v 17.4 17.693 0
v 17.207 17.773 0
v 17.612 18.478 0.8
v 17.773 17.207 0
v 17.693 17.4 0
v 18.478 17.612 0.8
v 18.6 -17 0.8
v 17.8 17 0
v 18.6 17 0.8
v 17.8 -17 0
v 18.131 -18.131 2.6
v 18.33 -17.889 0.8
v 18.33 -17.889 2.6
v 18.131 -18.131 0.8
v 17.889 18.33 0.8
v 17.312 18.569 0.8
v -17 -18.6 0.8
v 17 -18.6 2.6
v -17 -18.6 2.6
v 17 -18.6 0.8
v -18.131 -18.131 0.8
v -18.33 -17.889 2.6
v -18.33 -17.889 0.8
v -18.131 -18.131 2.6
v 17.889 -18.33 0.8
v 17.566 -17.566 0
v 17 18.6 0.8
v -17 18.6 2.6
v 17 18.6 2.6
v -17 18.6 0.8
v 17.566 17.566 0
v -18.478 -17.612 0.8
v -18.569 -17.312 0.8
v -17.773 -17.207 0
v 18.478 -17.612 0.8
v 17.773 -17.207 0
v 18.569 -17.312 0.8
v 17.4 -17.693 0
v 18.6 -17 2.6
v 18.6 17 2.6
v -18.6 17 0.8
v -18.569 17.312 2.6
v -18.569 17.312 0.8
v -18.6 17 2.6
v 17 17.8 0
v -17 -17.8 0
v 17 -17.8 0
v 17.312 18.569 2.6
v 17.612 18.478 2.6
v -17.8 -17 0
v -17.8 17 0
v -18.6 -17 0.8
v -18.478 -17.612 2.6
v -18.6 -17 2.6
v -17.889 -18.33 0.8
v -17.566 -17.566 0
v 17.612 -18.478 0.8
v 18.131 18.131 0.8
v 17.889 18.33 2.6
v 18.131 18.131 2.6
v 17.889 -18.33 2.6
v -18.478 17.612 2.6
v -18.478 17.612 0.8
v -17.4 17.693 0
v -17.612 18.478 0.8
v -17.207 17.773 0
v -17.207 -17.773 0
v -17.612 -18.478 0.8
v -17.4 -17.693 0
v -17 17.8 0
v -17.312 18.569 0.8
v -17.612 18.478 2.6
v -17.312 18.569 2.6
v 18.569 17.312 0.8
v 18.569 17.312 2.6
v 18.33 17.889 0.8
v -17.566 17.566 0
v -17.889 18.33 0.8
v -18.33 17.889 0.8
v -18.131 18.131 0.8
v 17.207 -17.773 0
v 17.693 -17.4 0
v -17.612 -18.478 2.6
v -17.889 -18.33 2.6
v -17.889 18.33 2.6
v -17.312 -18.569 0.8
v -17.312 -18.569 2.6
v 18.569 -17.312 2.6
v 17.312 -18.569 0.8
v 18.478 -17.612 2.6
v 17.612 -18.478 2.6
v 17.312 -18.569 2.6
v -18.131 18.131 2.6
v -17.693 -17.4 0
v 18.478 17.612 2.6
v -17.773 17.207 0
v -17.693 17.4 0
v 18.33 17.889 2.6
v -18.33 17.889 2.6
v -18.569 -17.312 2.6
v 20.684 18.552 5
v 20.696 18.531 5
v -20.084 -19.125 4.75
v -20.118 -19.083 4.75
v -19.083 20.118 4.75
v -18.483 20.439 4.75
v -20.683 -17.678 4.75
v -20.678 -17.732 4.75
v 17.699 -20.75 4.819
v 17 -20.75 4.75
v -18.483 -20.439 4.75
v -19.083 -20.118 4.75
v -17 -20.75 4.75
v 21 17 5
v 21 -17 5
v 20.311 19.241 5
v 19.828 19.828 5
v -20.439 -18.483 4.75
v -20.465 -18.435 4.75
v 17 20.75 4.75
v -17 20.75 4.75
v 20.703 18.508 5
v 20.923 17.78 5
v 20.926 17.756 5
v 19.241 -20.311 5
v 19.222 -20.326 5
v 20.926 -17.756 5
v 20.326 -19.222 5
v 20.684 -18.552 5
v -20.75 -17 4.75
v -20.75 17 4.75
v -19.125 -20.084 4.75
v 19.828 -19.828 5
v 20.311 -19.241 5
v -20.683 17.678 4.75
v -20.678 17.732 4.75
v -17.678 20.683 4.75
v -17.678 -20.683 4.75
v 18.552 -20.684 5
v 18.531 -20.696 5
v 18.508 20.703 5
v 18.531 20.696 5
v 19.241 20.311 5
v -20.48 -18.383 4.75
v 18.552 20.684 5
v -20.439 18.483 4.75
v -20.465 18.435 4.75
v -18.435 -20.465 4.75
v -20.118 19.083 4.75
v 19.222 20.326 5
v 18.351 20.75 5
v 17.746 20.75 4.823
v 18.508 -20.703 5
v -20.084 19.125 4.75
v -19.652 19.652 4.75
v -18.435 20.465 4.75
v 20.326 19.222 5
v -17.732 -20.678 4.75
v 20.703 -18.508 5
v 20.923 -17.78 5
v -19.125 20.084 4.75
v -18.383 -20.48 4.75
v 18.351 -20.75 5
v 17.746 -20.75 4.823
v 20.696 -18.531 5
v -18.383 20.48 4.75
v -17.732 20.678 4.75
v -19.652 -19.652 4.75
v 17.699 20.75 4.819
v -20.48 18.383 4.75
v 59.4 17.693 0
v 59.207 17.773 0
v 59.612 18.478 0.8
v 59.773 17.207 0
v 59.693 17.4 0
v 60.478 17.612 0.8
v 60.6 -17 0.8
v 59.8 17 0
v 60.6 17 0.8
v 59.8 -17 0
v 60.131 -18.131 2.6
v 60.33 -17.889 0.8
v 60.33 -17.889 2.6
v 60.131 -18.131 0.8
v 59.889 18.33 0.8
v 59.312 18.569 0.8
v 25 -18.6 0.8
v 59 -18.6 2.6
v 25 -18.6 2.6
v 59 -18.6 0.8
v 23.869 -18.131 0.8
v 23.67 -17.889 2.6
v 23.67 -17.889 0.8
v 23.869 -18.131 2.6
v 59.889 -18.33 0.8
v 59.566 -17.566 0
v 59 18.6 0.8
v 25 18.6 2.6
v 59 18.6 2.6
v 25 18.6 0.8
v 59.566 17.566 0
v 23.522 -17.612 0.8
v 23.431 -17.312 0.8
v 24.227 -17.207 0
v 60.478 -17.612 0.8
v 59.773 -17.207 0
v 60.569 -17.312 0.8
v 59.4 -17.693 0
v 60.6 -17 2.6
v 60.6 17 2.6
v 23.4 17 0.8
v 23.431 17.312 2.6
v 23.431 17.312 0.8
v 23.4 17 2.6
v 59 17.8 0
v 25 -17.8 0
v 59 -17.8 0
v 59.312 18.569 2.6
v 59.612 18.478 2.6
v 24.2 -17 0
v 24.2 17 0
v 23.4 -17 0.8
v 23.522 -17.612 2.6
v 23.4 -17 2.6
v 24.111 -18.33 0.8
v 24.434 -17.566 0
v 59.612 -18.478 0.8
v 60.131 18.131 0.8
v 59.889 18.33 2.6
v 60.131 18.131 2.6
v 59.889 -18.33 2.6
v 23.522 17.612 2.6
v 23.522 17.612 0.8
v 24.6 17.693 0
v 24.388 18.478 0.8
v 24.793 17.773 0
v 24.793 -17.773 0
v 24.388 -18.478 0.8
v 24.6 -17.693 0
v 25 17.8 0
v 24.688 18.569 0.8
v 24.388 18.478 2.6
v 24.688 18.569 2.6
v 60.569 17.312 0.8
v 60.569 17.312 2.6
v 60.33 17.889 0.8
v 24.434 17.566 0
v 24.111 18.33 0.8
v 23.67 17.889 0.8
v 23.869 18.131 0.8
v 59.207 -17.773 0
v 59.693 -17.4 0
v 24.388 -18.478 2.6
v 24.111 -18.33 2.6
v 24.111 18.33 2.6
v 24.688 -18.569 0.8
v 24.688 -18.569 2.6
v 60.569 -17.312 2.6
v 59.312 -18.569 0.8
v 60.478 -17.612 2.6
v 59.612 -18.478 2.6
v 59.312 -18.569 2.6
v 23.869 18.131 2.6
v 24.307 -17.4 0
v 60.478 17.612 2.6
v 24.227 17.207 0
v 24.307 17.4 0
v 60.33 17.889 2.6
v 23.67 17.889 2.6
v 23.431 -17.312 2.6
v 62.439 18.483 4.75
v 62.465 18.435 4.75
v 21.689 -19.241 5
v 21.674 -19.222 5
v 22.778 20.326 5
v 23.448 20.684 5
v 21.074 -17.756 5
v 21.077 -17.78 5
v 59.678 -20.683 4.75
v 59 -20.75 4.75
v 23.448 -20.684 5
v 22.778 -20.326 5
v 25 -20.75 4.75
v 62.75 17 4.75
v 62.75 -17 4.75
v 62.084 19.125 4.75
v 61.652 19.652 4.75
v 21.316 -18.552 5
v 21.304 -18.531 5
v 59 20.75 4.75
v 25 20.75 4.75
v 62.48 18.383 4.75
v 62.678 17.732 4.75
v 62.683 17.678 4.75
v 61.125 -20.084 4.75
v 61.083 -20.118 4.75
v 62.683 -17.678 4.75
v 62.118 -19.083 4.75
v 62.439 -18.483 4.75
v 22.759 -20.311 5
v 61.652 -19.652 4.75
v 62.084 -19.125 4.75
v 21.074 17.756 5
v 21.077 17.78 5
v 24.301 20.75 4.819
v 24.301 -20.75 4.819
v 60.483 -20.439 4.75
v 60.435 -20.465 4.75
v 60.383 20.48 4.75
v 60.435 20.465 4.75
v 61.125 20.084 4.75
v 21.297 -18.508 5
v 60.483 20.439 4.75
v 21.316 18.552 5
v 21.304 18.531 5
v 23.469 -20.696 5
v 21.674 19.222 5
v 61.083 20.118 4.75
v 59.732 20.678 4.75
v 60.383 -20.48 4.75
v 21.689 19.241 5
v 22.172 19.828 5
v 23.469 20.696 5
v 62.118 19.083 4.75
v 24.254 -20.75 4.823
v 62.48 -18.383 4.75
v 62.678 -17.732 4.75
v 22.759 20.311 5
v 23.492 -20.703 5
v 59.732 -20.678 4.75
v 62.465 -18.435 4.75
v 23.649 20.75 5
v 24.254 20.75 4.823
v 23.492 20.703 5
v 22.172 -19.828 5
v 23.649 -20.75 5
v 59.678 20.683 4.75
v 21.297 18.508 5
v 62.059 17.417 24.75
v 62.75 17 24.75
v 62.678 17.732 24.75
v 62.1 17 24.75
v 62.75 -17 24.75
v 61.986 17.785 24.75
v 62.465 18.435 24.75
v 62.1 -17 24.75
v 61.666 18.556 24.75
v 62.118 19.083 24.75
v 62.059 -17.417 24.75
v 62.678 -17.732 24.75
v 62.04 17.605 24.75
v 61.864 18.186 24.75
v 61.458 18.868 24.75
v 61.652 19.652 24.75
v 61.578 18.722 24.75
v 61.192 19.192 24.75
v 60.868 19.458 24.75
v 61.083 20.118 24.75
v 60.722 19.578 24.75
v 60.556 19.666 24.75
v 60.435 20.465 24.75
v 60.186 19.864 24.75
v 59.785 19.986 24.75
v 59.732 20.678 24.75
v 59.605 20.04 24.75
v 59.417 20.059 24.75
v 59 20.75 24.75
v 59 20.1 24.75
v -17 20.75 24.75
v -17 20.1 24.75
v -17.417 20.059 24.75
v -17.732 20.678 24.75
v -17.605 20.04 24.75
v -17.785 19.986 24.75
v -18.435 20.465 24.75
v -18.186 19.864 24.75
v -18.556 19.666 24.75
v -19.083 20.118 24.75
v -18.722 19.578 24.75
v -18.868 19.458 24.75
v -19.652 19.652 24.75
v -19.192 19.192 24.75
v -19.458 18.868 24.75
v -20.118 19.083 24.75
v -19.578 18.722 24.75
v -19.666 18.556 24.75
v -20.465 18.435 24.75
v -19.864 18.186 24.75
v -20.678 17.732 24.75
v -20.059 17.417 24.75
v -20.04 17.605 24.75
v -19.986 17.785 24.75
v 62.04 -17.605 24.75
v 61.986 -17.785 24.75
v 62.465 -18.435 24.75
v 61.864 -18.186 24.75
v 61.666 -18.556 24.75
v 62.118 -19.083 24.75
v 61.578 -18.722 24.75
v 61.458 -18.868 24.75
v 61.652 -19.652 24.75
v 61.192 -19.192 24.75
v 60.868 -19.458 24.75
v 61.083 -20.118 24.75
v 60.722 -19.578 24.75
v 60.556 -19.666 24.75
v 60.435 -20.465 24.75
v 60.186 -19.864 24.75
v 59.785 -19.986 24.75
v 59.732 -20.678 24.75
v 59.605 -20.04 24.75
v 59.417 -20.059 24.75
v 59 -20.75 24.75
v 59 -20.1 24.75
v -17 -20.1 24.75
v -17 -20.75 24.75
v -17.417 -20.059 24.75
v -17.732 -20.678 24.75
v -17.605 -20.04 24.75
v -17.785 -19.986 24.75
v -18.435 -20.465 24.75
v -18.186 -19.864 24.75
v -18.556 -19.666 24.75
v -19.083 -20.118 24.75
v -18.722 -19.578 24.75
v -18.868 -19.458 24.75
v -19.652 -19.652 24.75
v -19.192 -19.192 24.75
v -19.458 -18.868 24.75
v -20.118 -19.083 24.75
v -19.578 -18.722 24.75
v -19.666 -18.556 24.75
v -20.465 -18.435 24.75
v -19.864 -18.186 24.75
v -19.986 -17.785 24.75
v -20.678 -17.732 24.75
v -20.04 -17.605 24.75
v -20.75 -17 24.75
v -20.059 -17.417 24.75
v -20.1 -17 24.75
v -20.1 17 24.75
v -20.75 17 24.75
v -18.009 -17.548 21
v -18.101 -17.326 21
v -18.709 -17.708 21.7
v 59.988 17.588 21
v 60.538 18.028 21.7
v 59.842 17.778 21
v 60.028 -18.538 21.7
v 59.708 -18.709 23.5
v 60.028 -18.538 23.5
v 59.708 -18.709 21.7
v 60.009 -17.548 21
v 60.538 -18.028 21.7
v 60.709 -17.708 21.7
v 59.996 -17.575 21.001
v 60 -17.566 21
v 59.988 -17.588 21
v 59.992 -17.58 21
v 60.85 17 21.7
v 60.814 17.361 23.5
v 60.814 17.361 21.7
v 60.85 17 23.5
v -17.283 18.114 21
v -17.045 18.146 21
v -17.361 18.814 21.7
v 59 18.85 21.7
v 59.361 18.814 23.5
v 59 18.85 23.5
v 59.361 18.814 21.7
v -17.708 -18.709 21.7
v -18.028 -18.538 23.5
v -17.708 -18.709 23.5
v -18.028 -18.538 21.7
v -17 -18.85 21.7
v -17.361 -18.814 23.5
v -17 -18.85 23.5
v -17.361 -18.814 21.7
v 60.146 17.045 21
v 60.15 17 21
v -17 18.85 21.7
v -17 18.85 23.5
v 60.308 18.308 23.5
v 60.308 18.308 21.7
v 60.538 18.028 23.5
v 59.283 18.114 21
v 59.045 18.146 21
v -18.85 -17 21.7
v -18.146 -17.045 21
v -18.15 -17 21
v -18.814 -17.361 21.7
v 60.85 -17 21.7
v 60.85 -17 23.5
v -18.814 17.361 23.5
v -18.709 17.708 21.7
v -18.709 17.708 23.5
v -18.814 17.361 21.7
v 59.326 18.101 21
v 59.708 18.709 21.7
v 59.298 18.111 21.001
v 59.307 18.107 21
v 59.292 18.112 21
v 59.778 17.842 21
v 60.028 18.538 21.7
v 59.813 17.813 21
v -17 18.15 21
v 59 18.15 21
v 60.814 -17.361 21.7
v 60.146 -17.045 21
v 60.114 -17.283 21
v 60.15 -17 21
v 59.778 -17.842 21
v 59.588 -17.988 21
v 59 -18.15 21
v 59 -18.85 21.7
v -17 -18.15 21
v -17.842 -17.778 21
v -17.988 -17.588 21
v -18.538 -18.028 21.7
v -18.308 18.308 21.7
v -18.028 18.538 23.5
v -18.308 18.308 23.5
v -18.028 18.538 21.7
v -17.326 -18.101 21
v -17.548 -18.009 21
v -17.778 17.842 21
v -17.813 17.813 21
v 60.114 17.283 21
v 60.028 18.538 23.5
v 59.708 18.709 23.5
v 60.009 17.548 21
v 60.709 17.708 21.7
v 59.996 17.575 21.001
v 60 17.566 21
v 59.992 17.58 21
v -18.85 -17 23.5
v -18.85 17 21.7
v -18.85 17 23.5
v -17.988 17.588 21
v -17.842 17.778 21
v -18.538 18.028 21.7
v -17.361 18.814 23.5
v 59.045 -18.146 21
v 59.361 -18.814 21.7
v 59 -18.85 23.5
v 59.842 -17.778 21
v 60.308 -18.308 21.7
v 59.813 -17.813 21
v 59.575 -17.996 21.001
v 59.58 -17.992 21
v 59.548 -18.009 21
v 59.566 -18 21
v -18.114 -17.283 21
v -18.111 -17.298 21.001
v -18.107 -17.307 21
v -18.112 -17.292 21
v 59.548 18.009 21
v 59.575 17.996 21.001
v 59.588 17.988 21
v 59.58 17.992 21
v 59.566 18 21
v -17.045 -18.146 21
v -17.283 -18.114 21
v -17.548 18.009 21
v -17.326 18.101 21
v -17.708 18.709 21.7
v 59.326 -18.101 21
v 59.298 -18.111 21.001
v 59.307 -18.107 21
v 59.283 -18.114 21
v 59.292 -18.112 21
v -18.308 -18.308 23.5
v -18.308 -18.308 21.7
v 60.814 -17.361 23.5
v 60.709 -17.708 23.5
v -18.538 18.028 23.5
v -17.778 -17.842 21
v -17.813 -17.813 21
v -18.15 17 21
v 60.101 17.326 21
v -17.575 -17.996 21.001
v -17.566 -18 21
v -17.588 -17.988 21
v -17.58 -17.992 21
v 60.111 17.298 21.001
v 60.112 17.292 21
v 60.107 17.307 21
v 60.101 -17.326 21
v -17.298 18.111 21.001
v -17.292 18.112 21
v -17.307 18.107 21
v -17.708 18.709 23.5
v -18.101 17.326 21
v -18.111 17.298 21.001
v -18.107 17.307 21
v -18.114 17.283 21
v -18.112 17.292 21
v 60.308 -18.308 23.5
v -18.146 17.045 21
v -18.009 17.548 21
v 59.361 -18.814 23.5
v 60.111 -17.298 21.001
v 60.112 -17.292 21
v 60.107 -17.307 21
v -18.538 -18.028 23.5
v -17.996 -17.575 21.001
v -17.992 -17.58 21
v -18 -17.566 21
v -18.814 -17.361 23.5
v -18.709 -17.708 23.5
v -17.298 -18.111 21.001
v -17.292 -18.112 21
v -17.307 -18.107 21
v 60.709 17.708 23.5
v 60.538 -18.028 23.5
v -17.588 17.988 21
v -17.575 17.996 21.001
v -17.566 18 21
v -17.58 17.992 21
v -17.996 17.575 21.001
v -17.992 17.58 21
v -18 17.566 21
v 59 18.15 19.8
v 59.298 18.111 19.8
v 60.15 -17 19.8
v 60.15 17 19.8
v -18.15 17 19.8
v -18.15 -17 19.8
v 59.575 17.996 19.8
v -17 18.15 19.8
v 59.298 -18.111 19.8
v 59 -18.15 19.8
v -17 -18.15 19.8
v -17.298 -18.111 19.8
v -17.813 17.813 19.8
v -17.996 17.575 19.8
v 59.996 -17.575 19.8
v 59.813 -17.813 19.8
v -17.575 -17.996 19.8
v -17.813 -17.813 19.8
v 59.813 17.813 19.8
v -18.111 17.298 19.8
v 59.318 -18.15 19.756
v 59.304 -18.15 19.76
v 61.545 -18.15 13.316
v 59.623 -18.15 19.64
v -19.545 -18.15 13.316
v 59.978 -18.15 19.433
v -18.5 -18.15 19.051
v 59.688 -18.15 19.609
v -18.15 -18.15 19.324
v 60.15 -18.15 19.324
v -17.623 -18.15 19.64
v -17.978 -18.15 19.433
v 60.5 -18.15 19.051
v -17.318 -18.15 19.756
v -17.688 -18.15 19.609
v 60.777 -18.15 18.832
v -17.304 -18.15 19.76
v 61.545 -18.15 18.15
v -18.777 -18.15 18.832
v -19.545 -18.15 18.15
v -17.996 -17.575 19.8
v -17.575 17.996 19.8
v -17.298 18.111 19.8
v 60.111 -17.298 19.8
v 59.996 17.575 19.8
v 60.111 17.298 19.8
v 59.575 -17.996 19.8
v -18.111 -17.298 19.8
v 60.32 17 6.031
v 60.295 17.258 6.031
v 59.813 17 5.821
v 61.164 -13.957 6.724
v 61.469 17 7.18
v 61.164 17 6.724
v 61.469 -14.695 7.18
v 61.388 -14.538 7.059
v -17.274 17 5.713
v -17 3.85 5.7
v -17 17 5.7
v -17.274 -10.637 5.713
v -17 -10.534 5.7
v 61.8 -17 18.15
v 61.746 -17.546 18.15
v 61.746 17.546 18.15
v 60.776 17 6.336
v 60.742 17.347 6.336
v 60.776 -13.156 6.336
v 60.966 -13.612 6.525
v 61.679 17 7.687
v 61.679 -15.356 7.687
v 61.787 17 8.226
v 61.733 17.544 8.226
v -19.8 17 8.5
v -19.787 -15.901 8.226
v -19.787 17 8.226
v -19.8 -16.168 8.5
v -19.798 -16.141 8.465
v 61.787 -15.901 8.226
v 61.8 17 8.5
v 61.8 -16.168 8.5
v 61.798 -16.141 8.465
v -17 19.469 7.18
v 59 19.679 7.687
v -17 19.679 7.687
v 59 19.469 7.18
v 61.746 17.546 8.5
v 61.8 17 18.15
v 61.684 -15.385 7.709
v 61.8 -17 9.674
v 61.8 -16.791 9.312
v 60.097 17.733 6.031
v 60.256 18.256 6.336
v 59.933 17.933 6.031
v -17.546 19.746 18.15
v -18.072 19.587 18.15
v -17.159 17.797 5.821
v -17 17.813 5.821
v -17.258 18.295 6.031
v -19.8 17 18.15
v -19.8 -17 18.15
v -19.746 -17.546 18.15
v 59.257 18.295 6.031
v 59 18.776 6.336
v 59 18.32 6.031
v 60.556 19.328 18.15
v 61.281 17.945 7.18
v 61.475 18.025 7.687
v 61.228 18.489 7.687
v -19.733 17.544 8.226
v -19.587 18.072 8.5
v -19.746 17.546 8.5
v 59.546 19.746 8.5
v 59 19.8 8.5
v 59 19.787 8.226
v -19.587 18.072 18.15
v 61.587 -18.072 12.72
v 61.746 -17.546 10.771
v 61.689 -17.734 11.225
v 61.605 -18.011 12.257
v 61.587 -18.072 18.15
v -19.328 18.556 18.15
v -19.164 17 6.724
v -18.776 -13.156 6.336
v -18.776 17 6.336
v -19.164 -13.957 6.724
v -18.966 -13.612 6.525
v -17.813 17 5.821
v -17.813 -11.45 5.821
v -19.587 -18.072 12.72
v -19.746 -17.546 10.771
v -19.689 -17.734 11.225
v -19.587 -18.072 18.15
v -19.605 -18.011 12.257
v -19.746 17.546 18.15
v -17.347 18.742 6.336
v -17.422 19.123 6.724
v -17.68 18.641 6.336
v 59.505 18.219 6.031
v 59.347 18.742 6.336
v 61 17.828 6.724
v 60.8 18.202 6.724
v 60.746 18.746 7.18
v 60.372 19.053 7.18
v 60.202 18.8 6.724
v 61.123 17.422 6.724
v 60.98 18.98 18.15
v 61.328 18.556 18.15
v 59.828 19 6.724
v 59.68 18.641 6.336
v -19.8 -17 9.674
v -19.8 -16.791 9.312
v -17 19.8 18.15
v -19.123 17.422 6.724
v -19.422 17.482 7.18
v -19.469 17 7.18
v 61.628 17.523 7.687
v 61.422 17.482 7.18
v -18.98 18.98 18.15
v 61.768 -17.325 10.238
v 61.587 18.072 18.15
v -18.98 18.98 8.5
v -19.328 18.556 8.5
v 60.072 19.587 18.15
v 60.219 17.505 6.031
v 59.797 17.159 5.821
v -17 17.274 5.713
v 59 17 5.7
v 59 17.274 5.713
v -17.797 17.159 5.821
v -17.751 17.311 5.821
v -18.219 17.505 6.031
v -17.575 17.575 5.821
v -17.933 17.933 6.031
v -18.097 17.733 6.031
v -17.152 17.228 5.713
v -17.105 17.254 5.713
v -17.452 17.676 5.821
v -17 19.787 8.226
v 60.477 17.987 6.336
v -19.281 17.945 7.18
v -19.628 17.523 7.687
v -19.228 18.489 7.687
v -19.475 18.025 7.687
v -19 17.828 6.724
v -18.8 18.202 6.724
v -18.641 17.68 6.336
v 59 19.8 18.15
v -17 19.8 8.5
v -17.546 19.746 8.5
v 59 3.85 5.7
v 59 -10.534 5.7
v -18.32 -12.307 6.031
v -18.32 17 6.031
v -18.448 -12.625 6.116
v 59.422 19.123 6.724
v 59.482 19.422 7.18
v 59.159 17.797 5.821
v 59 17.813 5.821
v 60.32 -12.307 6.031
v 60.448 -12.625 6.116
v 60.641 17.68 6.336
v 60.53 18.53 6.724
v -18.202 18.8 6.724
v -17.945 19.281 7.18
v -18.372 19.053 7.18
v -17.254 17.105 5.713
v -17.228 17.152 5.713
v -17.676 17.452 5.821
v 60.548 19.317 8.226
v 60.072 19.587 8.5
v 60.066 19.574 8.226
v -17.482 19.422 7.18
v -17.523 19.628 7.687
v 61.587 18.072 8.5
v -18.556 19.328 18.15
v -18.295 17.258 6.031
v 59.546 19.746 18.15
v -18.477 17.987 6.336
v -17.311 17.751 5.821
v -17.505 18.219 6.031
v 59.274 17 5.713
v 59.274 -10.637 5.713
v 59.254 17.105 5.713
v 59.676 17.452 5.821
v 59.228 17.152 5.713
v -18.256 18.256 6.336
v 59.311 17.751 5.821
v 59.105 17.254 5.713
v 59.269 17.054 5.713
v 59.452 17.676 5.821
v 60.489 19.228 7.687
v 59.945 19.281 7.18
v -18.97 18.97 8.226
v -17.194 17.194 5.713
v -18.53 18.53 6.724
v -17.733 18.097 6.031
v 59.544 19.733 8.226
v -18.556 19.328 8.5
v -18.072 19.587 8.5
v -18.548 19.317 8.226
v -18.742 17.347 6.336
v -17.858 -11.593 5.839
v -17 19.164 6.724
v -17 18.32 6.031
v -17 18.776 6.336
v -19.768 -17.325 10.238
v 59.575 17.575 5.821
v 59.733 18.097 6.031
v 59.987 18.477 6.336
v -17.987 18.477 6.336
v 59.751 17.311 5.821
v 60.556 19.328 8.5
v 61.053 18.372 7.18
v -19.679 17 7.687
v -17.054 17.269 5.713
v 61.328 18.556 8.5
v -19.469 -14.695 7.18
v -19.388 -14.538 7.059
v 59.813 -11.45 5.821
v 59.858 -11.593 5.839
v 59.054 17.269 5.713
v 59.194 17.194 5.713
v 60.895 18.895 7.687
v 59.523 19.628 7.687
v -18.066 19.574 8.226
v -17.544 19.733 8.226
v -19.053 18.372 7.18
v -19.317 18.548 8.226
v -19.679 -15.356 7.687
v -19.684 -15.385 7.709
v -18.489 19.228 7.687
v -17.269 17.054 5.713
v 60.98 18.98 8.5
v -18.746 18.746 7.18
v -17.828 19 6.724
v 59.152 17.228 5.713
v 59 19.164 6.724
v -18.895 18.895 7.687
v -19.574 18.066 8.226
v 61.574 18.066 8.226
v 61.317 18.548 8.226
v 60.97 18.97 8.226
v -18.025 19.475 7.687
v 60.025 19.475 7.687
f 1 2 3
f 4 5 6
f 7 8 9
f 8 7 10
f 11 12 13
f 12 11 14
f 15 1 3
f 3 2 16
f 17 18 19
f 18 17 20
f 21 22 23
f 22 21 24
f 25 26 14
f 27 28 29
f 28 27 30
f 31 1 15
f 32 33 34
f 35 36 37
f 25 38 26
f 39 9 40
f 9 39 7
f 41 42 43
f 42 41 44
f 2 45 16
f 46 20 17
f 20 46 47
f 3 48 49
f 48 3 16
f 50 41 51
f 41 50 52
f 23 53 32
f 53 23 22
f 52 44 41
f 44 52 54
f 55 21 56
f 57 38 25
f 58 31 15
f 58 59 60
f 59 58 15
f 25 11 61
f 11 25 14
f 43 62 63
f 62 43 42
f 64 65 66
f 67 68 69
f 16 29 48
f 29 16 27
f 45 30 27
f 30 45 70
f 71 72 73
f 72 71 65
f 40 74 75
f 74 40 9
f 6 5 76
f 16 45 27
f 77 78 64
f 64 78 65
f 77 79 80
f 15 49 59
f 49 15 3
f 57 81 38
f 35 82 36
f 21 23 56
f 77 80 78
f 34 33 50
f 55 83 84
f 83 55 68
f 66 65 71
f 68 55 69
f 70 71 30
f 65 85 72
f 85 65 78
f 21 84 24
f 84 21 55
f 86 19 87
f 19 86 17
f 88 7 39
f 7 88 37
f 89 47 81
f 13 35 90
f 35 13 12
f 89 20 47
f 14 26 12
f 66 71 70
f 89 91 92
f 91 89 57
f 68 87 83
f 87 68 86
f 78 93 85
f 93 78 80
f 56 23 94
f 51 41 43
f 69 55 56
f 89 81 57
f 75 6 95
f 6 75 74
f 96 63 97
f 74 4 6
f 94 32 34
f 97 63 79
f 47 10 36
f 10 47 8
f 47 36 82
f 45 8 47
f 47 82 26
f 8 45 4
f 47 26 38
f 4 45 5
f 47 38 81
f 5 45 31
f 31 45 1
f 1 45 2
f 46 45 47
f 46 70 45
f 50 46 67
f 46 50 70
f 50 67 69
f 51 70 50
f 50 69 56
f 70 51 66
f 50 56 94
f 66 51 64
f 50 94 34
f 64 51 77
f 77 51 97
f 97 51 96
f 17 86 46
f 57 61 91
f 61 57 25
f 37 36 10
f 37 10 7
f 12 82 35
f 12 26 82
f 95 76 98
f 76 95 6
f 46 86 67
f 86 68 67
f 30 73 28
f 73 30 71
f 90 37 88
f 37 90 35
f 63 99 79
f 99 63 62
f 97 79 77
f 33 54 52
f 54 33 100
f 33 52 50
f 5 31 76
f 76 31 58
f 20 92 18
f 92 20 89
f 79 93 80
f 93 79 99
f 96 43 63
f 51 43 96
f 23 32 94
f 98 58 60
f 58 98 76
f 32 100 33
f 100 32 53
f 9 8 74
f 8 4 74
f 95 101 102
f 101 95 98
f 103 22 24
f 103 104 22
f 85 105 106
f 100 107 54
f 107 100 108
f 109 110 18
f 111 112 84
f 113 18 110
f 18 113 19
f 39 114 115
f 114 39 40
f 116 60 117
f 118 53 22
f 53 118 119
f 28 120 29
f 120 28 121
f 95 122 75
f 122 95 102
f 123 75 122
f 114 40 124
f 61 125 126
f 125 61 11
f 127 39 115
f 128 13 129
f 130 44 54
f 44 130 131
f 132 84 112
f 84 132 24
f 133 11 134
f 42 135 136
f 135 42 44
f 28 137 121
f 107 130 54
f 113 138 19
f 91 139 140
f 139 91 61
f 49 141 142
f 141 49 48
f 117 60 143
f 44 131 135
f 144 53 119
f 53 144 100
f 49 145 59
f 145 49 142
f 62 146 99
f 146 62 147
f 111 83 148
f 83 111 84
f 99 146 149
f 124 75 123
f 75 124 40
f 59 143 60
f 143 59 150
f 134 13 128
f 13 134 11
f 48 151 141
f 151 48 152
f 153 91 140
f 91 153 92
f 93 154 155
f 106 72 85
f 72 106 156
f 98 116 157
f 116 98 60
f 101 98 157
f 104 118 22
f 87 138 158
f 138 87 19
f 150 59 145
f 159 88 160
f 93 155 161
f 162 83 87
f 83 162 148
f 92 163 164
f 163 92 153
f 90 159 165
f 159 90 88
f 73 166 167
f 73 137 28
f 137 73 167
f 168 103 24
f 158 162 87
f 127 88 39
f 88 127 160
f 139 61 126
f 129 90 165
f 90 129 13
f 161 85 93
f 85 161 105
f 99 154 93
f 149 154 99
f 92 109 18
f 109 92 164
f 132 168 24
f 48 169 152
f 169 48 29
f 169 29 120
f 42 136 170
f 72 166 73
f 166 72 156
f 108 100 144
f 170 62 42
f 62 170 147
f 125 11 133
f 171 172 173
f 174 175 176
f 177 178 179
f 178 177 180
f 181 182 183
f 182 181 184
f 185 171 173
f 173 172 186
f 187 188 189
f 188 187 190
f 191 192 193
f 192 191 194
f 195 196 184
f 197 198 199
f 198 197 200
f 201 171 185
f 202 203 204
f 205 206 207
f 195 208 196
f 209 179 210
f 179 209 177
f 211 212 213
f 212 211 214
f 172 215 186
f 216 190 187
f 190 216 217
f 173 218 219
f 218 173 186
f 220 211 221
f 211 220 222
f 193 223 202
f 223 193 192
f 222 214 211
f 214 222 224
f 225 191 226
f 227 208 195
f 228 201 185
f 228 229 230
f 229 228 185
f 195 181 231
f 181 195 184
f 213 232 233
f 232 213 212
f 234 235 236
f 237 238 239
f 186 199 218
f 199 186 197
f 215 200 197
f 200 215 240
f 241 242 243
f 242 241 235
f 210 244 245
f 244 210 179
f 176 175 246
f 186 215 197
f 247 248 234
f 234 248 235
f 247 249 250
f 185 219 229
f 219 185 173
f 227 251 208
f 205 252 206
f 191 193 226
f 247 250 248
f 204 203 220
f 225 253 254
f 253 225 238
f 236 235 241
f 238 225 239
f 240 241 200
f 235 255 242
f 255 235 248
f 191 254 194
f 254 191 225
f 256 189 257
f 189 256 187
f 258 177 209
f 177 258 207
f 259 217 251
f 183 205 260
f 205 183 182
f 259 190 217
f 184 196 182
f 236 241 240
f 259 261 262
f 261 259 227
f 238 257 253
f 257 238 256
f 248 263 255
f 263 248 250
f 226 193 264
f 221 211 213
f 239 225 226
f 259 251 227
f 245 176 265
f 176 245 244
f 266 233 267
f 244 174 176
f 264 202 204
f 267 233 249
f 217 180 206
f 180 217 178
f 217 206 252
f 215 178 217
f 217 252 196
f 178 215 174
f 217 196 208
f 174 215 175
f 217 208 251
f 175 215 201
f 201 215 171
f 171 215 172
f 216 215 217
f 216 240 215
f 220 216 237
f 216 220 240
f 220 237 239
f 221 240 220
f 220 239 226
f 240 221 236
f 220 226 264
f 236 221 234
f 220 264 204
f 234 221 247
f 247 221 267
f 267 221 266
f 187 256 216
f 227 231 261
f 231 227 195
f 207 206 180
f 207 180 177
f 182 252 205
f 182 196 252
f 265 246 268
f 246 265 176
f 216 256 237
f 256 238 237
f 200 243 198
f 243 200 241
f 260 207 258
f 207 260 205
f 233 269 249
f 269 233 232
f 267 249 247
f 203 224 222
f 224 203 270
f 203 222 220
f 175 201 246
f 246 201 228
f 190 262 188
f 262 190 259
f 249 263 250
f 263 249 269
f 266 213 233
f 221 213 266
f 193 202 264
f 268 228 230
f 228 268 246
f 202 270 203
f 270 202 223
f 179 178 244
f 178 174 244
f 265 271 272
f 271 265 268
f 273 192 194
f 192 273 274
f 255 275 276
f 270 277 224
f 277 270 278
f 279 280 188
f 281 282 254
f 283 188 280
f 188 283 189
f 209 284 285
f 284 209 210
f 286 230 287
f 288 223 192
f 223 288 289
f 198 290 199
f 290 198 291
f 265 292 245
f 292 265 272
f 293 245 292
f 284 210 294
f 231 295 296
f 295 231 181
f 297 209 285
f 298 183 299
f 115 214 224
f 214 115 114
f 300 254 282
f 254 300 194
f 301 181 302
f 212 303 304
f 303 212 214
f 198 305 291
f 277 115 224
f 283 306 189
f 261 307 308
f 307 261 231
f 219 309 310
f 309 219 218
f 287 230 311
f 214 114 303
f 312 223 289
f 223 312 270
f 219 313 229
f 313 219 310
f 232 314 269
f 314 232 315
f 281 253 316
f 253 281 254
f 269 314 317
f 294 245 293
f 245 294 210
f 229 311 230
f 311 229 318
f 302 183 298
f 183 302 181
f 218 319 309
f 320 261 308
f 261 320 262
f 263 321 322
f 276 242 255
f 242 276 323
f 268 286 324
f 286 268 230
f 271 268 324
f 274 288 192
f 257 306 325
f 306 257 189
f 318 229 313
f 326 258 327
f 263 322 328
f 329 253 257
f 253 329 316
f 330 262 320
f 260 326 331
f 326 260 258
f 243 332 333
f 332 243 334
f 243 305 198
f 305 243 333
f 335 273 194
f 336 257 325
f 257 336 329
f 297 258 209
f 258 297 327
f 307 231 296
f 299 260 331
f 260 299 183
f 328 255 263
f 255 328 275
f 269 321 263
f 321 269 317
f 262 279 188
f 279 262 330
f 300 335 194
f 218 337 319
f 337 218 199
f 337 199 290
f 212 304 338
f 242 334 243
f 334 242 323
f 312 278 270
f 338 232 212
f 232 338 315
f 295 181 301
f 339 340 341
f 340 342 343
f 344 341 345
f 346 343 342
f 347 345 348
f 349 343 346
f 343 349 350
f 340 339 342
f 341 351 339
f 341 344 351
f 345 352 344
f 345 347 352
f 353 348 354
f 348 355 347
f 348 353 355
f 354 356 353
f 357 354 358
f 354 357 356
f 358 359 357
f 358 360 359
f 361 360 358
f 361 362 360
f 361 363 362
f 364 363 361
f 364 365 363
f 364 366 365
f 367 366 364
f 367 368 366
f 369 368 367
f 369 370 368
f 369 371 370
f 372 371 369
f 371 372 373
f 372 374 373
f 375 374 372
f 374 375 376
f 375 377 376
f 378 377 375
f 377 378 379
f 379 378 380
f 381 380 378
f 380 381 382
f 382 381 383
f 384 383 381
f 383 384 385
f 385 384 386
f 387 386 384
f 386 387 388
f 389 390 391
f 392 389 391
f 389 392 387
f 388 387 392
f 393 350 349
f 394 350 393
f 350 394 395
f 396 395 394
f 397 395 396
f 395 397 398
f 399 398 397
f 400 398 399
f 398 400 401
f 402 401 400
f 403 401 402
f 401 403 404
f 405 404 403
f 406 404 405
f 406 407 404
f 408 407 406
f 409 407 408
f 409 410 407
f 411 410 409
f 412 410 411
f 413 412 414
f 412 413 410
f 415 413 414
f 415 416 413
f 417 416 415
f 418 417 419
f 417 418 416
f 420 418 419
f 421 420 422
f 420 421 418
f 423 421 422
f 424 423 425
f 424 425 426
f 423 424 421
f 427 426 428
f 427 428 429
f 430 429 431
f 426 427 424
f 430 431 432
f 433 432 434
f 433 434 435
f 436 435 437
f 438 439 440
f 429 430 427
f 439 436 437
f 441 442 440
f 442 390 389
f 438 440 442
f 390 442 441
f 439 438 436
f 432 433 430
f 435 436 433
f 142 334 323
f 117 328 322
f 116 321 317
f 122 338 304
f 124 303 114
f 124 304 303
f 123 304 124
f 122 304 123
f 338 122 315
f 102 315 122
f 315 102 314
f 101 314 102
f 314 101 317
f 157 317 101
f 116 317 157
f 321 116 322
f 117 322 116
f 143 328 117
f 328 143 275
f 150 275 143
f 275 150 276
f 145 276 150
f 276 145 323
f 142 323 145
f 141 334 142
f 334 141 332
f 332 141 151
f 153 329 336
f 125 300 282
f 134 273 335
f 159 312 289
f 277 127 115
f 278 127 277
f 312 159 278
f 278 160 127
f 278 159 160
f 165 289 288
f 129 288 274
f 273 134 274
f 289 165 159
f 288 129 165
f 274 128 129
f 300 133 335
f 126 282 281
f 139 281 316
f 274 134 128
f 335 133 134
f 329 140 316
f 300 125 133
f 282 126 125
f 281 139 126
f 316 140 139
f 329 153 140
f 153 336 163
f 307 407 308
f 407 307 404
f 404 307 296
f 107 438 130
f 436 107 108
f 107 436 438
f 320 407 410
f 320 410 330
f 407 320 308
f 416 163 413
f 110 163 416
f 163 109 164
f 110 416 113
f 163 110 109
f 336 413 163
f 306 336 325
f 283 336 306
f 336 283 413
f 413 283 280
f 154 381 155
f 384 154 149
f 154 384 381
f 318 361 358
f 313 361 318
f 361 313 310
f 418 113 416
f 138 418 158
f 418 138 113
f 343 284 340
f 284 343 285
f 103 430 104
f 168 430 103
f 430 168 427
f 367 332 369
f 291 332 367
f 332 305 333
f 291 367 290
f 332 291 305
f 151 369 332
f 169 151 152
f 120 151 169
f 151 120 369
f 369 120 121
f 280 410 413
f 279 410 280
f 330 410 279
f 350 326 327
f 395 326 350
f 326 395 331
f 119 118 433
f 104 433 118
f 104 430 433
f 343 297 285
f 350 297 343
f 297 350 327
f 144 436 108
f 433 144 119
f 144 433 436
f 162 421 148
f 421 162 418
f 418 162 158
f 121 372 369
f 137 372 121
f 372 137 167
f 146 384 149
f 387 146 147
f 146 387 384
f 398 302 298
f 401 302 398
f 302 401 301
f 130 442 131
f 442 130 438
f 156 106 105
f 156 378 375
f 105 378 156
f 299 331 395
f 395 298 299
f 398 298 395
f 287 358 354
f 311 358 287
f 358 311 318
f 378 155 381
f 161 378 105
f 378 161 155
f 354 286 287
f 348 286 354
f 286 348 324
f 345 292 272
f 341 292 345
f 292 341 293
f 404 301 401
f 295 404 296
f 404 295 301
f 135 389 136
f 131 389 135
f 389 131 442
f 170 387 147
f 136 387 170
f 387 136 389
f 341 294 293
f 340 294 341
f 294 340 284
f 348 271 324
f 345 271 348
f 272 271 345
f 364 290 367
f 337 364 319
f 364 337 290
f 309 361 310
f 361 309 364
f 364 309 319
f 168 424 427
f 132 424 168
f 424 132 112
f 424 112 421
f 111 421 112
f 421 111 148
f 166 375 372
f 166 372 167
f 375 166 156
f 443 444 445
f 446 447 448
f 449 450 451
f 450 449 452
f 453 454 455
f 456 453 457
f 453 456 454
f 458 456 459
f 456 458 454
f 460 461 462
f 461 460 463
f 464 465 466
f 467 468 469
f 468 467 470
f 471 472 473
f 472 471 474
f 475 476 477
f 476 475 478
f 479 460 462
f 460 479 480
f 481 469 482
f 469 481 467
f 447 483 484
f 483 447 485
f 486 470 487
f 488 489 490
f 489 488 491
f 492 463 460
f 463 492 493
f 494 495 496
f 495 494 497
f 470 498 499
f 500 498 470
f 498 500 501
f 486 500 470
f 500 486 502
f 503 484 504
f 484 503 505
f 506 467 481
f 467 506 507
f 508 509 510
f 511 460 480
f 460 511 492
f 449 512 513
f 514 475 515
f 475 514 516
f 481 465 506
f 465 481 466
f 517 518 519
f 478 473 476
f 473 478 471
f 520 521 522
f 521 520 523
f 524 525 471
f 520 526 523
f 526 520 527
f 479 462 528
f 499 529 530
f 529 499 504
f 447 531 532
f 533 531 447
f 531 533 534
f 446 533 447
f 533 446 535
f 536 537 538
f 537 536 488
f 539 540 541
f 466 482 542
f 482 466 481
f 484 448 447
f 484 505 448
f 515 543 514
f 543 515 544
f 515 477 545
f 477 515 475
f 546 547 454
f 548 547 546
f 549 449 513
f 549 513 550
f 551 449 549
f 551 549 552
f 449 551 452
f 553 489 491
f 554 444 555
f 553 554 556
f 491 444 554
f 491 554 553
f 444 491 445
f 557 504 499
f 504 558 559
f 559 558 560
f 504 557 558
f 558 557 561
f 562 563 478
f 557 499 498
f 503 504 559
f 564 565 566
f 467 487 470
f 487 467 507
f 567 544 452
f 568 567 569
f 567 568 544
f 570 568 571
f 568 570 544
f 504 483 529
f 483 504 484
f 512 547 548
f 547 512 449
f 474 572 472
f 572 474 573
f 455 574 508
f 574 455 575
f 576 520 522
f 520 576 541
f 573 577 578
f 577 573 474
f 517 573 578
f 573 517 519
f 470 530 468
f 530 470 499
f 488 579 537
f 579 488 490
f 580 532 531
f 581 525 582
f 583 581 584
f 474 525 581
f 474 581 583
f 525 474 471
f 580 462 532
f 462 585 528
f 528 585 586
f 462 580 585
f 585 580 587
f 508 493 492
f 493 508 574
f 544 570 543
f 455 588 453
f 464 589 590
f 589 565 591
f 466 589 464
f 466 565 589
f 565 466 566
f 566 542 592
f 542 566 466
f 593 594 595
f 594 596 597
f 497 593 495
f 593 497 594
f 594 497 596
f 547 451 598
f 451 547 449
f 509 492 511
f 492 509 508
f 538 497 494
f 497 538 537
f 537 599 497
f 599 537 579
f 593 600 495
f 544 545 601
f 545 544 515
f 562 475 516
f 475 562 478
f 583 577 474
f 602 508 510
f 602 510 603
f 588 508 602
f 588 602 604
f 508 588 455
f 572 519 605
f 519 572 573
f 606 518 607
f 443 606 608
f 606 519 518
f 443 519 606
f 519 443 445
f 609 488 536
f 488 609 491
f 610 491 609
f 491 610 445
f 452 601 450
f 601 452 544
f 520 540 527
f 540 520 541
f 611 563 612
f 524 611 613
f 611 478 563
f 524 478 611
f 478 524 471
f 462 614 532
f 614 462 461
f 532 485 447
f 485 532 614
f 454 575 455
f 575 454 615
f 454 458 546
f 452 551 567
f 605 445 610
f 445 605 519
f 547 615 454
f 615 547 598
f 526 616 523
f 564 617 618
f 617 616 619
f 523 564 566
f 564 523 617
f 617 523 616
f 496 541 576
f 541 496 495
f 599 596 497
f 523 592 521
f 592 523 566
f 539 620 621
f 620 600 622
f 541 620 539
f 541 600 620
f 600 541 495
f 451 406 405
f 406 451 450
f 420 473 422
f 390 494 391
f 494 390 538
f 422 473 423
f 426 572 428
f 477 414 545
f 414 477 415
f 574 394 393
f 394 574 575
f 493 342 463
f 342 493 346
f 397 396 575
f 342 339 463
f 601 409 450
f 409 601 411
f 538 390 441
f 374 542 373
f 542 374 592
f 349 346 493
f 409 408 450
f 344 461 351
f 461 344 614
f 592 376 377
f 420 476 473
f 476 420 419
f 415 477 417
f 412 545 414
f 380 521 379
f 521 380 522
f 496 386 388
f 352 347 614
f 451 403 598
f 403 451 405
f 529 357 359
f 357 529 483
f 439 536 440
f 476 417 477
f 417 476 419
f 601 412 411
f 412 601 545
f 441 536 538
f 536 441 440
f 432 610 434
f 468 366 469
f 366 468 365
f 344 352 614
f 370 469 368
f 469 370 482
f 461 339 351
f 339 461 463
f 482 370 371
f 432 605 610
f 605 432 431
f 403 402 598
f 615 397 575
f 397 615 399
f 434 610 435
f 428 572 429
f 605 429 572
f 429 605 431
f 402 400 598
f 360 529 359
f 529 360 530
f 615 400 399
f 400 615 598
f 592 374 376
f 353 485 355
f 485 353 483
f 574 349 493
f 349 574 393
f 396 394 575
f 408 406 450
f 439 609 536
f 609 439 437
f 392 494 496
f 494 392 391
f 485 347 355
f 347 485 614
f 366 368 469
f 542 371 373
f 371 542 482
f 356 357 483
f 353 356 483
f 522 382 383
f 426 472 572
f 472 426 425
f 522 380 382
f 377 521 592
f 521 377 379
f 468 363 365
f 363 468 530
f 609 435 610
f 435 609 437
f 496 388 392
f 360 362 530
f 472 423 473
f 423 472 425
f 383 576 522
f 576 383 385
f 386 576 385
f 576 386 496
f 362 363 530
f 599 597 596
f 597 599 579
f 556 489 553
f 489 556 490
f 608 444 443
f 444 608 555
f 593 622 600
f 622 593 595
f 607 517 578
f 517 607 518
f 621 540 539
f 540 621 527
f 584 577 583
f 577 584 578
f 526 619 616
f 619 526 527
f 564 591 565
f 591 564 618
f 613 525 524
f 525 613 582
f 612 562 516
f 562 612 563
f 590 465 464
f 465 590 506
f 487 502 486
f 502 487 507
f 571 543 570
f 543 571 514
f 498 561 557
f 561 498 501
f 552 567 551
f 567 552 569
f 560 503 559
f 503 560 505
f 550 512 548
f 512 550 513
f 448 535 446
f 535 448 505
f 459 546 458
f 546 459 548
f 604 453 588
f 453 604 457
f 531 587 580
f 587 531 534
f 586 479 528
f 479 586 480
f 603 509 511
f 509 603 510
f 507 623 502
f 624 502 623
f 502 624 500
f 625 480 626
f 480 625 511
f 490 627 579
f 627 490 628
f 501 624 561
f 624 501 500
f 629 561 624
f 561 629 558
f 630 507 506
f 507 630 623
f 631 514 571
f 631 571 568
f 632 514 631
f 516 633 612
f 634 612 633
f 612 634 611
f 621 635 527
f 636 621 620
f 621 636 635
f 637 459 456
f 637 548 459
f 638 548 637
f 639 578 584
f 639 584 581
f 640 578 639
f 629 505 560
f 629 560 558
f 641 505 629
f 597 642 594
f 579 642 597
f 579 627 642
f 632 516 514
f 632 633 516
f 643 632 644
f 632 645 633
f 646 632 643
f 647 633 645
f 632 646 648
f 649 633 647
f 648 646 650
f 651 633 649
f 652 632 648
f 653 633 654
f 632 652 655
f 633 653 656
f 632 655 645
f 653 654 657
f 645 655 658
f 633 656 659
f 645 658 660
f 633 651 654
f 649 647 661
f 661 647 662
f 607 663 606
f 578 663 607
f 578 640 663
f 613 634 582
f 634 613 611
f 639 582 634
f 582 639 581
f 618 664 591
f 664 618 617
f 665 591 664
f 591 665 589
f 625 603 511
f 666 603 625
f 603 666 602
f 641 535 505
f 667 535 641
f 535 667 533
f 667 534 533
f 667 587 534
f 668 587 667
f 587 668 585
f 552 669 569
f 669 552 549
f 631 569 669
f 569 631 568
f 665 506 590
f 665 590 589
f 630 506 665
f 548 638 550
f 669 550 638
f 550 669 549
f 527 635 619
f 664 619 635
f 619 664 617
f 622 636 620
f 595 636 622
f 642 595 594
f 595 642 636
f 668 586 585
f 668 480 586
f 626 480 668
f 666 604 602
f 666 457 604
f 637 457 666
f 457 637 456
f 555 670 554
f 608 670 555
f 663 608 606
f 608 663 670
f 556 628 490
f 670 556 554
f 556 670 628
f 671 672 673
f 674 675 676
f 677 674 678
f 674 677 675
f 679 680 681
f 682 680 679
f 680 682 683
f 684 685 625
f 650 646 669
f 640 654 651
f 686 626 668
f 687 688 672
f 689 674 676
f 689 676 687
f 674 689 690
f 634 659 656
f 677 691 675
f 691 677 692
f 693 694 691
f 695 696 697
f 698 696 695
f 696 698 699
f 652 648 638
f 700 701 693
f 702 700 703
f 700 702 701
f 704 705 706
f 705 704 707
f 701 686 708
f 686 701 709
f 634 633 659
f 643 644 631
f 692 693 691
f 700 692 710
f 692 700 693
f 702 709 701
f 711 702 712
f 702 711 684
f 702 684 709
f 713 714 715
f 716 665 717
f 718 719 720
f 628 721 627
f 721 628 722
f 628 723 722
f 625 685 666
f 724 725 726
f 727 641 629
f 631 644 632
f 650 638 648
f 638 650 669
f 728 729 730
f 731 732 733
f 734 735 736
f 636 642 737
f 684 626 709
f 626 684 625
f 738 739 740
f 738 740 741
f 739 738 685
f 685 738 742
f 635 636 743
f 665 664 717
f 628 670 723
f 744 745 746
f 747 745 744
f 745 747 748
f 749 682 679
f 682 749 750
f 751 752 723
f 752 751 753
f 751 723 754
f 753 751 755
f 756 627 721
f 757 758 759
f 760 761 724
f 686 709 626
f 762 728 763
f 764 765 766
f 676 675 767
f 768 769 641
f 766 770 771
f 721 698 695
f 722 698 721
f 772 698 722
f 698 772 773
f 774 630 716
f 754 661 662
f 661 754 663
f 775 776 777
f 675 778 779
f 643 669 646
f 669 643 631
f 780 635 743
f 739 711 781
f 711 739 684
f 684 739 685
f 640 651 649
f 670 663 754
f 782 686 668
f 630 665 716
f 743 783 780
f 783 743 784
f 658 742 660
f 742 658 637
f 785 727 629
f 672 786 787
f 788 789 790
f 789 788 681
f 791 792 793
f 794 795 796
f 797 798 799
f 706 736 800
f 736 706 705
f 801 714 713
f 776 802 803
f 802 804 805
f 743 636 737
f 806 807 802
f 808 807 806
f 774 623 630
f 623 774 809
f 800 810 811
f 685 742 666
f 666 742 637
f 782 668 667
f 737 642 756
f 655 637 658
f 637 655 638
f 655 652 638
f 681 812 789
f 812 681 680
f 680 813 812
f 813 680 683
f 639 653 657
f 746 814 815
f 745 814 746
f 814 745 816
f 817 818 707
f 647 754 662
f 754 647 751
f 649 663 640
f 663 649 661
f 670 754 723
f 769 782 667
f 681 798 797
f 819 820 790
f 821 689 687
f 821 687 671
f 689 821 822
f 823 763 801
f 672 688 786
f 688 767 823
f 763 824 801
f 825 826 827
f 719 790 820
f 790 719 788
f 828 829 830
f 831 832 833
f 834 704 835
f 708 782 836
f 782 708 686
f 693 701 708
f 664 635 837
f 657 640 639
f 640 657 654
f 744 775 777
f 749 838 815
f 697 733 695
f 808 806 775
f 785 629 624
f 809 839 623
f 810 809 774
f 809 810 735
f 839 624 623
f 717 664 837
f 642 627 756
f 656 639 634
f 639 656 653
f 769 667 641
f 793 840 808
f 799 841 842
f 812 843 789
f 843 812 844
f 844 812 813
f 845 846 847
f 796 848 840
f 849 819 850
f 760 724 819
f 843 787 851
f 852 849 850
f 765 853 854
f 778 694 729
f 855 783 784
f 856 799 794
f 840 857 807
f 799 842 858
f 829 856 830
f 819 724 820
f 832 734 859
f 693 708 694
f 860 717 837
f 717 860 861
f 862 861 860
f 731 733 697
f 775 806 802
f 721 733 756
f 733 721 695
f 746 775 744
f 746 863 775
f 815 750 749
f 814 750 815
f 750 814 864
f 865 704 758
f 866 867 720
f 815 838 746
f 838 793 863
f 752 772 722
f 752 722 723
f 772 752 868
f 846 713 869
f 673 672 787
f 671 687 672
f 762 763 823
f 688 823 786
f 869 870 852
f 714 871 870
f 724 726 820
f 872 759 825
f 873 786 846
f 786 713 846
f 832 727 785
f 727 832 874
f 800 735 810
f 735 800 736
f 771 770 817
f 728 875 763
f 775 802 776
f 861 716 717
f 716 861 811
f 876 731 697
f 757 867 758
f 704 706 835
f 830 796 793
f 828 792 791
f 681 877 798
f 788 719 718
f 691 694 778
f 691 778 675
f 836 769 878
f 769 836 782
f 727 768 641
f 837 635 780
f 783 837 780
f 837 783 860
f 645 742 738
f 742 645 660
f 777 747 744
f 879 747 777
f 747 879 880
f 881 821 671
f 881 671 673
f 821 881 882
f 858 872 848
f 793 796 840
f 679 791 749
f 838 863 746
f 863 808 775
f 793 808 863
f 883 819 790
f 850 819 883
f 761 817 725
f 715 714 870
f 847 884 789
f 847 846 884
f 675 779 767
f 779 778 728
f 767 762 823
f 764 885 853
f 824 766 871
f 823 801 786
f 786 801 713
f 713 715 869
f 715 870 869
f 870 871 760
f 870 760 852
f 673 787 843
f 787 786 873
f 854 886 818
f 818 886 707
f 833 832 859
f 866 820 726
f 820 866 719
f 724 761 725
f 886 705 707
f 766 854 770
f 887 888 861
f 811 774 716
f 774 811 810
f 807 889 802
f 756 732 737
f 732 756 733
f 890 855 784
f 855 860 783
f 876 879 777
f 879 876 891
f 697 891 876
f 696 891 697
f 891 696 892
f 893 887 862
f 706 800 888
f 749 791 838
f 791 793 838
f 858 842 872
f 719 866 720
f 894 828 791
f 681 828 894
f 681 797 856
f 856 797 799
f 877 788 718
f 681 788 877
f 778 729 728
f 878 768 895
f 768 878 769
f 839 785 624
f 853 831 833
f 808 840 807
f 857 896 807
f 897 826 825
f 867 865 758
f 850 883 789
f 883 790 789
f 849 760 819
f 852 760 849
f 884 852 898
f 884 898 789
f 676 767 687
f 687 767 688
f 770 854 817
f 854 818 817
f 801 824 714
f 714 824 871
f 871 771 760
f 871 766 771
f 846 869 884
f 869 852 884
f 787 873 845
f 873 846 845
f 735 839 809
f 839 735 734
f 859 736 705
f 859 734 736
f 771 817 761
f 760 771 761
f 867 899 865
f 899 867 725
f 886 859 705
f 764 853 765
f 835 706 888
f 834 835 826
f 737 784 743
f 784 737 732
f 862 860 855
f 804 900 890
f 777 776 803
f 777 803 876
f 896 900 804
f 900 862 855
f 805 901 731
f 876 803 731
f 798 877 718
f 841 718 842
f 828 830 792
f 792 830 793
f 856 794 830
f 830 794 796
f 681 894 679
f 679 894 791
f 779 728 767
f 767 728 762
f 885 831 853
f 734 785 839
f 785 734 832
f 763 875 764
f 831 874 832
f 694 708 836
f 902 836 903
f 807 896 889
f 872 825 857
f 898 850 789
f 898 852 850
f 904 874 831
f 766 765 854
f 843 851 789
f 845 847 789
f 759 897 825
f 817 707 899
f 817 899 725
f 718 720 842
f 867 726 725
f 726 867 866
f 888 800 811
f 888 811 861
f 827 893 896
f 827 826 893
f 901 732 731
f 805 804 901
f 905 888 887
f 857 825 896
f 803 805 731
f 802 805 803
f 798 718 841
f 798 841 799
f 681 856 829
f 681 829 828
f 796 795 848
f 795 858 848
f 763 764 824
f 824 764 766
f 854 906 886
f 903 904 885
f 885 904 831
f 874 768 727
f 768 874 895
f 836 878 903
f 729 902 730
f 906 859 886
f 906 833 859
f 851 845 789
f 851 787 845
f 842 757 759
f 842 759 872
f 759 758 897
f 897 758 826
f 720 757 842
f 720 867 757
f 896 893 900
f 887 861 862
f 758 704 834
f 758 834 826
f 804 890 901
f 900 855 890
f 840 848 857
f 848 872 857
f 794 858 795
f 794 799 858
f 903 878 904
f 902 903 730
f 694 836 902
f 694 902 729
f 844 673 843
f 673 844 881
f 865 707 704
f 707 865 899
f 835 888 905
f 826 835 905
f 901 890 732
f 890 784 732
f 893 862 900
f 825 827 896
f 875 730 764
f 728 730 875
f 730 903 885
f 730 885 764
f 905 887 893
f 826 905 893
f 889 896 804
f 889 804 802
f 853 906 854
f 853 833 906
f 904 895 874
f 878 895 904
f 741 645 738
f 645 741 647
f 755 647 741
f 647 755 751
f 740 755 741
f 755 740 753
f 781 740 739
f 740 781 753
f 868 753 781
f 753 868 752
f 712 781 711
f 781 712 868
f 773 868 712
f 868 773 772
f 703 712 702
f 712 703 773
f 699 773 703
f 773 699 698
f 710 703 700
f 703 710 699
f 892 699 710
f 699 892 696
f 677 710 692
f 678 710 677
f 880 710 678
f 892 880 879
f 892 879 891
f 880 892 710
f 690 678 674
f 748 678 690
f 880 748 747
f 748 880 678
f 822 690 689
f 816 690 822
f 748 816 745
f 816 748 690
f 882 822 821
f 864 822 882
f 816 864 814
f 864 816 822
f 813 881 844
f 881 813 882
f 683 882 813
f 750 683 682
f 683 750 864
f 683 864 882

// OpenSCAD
// include <gridfinity_modules.scad>
use <gridfinity_cup_modules.scad>

// X dimension in grid units
width = 2; // [ 0.5, 1, 1.5, 2, 2.5, 3, 3.5, 4, 4.5, 5, 5.5, 6, 6.5, 7, 7.5, 8, 8.5, 9, 9.5, 10, 10.5, 11, 11.5, 12, 12.5, 13 ]
// Y dimension in grid units
depth = 1; // [ 0.5, 1, 1.5, 2, 2.5, 3, 3.5, 4, 4.5, 5, 5.5, 6, 6.5, 7, 7.5, 8, 8.5, 9, 9.5, 10, 10.5, 11, 11.5, 12, 12.5, 13 ]
// Z dimension (multiples of 7mm)
height = 3;
// (Zack's design uses magnet diameter of 6.5)
magnet_diameter = 0;  // .1
// (Zack's design uses depth of 6)
screw_depth = 0;
// Hole overhang remedy is active only when both screws and magnets are nonzero (and this option is selected)
hole_overhang_remedy = true;
//Only add attachments (magnets and screw) to box corners (prints faster).
box_corner_attachments_only = false;
// Fill in solid block (overrides all following options)
filled_in = false;
// X dimension subdivisions
chambers = 1;
// Include overhang for labeling (and specify left/right/center justification)
withLabel = "disabled"; // ["disabled", "left", "right", "center", "leftchamber", "rightchamber", "centerchamber"]
// Include larger corner fillet
fingerslide = true;
// Width of the label in number of units, or zero means full width
labelWidth = 0;  // .01
// Minimum thickness above cutouts in base (Zack's design is effectively 1.2)
floor_thickness = 0.7;
// Wall thickness (Zack's design is 0.95)
wall_thickness = 0.95;  // .01
// Efficient floor option saves material and time, but the floor is not smooth (only applies if no magnets, screws, or finger-slide used)
efficient_floor = false;
// When enabled, irregular subdivisions have to be defined in code
irregular_subdivisions = false;
// Enable to subdivide bottom pads to allow half-cell offsets
half_pitch = false;
// Remove some or all of lip
lip_style = "normal";  // [ "normal", "reduced", "none" ]

module end_of_customizer_opts() {}

// Separator positions are defined in terms of grid units from the left end
separator_positions = [ 0.25, 0.5, 1.4 ];

if (filled_in) {
  grid_block(width, depth, height, magnet_diameter=magnet_diameter, 
    screw_depth=screw_depth, hole_overhang_remedy=hole_overhang_remedy,
    half_pitch=half_pitch, box_corner_attachments_only=box_corner_attachments_only);
}
else if (irregular_subdivisions) {
  irregular_cup(
    num_x=width,
    num_y=depth,
    num_z=height,
    withLabel=withLabel,
    labelWidth=labelWidth,
    fingerslide=fingerslide,
    magnet_diameter=magnet_diameter,
    screw_depth=screw_depth,
    floor_thickness=floor_thickness,
    wall_thickness=wall_thickness,
    hole_overhang_remedy=hole_overhang_remedy,
    separator_positions=separator_positions,
    half_pitch=half_pitch,
    lip_style=lip_style,
    box_corner_attachments_only=box_corner_attachments_only
  );
}
else {
  basic_cup(
    num_x=width,
    num_y=depth,
    num_z=height,
    chambers=chambers,
    withLabel=withLabel,
    labelWidth=labelWidth,
    fingerslide=fingerslide,
    magnet_diameter=magnet_diameter,
    screw_depth=screw_depth,
    floor_thickness=floor_thickness,
    wall_thickness=wall_thickness,
    hole_overhang_remedy=hole_overhang_remedy,
    efficient_floor=efficient_floor,
    half_pitch=half_pitch,
    lip_style=lip_style,
    box_corner_attachments_only=box_corner_attachments_only
  );
}
